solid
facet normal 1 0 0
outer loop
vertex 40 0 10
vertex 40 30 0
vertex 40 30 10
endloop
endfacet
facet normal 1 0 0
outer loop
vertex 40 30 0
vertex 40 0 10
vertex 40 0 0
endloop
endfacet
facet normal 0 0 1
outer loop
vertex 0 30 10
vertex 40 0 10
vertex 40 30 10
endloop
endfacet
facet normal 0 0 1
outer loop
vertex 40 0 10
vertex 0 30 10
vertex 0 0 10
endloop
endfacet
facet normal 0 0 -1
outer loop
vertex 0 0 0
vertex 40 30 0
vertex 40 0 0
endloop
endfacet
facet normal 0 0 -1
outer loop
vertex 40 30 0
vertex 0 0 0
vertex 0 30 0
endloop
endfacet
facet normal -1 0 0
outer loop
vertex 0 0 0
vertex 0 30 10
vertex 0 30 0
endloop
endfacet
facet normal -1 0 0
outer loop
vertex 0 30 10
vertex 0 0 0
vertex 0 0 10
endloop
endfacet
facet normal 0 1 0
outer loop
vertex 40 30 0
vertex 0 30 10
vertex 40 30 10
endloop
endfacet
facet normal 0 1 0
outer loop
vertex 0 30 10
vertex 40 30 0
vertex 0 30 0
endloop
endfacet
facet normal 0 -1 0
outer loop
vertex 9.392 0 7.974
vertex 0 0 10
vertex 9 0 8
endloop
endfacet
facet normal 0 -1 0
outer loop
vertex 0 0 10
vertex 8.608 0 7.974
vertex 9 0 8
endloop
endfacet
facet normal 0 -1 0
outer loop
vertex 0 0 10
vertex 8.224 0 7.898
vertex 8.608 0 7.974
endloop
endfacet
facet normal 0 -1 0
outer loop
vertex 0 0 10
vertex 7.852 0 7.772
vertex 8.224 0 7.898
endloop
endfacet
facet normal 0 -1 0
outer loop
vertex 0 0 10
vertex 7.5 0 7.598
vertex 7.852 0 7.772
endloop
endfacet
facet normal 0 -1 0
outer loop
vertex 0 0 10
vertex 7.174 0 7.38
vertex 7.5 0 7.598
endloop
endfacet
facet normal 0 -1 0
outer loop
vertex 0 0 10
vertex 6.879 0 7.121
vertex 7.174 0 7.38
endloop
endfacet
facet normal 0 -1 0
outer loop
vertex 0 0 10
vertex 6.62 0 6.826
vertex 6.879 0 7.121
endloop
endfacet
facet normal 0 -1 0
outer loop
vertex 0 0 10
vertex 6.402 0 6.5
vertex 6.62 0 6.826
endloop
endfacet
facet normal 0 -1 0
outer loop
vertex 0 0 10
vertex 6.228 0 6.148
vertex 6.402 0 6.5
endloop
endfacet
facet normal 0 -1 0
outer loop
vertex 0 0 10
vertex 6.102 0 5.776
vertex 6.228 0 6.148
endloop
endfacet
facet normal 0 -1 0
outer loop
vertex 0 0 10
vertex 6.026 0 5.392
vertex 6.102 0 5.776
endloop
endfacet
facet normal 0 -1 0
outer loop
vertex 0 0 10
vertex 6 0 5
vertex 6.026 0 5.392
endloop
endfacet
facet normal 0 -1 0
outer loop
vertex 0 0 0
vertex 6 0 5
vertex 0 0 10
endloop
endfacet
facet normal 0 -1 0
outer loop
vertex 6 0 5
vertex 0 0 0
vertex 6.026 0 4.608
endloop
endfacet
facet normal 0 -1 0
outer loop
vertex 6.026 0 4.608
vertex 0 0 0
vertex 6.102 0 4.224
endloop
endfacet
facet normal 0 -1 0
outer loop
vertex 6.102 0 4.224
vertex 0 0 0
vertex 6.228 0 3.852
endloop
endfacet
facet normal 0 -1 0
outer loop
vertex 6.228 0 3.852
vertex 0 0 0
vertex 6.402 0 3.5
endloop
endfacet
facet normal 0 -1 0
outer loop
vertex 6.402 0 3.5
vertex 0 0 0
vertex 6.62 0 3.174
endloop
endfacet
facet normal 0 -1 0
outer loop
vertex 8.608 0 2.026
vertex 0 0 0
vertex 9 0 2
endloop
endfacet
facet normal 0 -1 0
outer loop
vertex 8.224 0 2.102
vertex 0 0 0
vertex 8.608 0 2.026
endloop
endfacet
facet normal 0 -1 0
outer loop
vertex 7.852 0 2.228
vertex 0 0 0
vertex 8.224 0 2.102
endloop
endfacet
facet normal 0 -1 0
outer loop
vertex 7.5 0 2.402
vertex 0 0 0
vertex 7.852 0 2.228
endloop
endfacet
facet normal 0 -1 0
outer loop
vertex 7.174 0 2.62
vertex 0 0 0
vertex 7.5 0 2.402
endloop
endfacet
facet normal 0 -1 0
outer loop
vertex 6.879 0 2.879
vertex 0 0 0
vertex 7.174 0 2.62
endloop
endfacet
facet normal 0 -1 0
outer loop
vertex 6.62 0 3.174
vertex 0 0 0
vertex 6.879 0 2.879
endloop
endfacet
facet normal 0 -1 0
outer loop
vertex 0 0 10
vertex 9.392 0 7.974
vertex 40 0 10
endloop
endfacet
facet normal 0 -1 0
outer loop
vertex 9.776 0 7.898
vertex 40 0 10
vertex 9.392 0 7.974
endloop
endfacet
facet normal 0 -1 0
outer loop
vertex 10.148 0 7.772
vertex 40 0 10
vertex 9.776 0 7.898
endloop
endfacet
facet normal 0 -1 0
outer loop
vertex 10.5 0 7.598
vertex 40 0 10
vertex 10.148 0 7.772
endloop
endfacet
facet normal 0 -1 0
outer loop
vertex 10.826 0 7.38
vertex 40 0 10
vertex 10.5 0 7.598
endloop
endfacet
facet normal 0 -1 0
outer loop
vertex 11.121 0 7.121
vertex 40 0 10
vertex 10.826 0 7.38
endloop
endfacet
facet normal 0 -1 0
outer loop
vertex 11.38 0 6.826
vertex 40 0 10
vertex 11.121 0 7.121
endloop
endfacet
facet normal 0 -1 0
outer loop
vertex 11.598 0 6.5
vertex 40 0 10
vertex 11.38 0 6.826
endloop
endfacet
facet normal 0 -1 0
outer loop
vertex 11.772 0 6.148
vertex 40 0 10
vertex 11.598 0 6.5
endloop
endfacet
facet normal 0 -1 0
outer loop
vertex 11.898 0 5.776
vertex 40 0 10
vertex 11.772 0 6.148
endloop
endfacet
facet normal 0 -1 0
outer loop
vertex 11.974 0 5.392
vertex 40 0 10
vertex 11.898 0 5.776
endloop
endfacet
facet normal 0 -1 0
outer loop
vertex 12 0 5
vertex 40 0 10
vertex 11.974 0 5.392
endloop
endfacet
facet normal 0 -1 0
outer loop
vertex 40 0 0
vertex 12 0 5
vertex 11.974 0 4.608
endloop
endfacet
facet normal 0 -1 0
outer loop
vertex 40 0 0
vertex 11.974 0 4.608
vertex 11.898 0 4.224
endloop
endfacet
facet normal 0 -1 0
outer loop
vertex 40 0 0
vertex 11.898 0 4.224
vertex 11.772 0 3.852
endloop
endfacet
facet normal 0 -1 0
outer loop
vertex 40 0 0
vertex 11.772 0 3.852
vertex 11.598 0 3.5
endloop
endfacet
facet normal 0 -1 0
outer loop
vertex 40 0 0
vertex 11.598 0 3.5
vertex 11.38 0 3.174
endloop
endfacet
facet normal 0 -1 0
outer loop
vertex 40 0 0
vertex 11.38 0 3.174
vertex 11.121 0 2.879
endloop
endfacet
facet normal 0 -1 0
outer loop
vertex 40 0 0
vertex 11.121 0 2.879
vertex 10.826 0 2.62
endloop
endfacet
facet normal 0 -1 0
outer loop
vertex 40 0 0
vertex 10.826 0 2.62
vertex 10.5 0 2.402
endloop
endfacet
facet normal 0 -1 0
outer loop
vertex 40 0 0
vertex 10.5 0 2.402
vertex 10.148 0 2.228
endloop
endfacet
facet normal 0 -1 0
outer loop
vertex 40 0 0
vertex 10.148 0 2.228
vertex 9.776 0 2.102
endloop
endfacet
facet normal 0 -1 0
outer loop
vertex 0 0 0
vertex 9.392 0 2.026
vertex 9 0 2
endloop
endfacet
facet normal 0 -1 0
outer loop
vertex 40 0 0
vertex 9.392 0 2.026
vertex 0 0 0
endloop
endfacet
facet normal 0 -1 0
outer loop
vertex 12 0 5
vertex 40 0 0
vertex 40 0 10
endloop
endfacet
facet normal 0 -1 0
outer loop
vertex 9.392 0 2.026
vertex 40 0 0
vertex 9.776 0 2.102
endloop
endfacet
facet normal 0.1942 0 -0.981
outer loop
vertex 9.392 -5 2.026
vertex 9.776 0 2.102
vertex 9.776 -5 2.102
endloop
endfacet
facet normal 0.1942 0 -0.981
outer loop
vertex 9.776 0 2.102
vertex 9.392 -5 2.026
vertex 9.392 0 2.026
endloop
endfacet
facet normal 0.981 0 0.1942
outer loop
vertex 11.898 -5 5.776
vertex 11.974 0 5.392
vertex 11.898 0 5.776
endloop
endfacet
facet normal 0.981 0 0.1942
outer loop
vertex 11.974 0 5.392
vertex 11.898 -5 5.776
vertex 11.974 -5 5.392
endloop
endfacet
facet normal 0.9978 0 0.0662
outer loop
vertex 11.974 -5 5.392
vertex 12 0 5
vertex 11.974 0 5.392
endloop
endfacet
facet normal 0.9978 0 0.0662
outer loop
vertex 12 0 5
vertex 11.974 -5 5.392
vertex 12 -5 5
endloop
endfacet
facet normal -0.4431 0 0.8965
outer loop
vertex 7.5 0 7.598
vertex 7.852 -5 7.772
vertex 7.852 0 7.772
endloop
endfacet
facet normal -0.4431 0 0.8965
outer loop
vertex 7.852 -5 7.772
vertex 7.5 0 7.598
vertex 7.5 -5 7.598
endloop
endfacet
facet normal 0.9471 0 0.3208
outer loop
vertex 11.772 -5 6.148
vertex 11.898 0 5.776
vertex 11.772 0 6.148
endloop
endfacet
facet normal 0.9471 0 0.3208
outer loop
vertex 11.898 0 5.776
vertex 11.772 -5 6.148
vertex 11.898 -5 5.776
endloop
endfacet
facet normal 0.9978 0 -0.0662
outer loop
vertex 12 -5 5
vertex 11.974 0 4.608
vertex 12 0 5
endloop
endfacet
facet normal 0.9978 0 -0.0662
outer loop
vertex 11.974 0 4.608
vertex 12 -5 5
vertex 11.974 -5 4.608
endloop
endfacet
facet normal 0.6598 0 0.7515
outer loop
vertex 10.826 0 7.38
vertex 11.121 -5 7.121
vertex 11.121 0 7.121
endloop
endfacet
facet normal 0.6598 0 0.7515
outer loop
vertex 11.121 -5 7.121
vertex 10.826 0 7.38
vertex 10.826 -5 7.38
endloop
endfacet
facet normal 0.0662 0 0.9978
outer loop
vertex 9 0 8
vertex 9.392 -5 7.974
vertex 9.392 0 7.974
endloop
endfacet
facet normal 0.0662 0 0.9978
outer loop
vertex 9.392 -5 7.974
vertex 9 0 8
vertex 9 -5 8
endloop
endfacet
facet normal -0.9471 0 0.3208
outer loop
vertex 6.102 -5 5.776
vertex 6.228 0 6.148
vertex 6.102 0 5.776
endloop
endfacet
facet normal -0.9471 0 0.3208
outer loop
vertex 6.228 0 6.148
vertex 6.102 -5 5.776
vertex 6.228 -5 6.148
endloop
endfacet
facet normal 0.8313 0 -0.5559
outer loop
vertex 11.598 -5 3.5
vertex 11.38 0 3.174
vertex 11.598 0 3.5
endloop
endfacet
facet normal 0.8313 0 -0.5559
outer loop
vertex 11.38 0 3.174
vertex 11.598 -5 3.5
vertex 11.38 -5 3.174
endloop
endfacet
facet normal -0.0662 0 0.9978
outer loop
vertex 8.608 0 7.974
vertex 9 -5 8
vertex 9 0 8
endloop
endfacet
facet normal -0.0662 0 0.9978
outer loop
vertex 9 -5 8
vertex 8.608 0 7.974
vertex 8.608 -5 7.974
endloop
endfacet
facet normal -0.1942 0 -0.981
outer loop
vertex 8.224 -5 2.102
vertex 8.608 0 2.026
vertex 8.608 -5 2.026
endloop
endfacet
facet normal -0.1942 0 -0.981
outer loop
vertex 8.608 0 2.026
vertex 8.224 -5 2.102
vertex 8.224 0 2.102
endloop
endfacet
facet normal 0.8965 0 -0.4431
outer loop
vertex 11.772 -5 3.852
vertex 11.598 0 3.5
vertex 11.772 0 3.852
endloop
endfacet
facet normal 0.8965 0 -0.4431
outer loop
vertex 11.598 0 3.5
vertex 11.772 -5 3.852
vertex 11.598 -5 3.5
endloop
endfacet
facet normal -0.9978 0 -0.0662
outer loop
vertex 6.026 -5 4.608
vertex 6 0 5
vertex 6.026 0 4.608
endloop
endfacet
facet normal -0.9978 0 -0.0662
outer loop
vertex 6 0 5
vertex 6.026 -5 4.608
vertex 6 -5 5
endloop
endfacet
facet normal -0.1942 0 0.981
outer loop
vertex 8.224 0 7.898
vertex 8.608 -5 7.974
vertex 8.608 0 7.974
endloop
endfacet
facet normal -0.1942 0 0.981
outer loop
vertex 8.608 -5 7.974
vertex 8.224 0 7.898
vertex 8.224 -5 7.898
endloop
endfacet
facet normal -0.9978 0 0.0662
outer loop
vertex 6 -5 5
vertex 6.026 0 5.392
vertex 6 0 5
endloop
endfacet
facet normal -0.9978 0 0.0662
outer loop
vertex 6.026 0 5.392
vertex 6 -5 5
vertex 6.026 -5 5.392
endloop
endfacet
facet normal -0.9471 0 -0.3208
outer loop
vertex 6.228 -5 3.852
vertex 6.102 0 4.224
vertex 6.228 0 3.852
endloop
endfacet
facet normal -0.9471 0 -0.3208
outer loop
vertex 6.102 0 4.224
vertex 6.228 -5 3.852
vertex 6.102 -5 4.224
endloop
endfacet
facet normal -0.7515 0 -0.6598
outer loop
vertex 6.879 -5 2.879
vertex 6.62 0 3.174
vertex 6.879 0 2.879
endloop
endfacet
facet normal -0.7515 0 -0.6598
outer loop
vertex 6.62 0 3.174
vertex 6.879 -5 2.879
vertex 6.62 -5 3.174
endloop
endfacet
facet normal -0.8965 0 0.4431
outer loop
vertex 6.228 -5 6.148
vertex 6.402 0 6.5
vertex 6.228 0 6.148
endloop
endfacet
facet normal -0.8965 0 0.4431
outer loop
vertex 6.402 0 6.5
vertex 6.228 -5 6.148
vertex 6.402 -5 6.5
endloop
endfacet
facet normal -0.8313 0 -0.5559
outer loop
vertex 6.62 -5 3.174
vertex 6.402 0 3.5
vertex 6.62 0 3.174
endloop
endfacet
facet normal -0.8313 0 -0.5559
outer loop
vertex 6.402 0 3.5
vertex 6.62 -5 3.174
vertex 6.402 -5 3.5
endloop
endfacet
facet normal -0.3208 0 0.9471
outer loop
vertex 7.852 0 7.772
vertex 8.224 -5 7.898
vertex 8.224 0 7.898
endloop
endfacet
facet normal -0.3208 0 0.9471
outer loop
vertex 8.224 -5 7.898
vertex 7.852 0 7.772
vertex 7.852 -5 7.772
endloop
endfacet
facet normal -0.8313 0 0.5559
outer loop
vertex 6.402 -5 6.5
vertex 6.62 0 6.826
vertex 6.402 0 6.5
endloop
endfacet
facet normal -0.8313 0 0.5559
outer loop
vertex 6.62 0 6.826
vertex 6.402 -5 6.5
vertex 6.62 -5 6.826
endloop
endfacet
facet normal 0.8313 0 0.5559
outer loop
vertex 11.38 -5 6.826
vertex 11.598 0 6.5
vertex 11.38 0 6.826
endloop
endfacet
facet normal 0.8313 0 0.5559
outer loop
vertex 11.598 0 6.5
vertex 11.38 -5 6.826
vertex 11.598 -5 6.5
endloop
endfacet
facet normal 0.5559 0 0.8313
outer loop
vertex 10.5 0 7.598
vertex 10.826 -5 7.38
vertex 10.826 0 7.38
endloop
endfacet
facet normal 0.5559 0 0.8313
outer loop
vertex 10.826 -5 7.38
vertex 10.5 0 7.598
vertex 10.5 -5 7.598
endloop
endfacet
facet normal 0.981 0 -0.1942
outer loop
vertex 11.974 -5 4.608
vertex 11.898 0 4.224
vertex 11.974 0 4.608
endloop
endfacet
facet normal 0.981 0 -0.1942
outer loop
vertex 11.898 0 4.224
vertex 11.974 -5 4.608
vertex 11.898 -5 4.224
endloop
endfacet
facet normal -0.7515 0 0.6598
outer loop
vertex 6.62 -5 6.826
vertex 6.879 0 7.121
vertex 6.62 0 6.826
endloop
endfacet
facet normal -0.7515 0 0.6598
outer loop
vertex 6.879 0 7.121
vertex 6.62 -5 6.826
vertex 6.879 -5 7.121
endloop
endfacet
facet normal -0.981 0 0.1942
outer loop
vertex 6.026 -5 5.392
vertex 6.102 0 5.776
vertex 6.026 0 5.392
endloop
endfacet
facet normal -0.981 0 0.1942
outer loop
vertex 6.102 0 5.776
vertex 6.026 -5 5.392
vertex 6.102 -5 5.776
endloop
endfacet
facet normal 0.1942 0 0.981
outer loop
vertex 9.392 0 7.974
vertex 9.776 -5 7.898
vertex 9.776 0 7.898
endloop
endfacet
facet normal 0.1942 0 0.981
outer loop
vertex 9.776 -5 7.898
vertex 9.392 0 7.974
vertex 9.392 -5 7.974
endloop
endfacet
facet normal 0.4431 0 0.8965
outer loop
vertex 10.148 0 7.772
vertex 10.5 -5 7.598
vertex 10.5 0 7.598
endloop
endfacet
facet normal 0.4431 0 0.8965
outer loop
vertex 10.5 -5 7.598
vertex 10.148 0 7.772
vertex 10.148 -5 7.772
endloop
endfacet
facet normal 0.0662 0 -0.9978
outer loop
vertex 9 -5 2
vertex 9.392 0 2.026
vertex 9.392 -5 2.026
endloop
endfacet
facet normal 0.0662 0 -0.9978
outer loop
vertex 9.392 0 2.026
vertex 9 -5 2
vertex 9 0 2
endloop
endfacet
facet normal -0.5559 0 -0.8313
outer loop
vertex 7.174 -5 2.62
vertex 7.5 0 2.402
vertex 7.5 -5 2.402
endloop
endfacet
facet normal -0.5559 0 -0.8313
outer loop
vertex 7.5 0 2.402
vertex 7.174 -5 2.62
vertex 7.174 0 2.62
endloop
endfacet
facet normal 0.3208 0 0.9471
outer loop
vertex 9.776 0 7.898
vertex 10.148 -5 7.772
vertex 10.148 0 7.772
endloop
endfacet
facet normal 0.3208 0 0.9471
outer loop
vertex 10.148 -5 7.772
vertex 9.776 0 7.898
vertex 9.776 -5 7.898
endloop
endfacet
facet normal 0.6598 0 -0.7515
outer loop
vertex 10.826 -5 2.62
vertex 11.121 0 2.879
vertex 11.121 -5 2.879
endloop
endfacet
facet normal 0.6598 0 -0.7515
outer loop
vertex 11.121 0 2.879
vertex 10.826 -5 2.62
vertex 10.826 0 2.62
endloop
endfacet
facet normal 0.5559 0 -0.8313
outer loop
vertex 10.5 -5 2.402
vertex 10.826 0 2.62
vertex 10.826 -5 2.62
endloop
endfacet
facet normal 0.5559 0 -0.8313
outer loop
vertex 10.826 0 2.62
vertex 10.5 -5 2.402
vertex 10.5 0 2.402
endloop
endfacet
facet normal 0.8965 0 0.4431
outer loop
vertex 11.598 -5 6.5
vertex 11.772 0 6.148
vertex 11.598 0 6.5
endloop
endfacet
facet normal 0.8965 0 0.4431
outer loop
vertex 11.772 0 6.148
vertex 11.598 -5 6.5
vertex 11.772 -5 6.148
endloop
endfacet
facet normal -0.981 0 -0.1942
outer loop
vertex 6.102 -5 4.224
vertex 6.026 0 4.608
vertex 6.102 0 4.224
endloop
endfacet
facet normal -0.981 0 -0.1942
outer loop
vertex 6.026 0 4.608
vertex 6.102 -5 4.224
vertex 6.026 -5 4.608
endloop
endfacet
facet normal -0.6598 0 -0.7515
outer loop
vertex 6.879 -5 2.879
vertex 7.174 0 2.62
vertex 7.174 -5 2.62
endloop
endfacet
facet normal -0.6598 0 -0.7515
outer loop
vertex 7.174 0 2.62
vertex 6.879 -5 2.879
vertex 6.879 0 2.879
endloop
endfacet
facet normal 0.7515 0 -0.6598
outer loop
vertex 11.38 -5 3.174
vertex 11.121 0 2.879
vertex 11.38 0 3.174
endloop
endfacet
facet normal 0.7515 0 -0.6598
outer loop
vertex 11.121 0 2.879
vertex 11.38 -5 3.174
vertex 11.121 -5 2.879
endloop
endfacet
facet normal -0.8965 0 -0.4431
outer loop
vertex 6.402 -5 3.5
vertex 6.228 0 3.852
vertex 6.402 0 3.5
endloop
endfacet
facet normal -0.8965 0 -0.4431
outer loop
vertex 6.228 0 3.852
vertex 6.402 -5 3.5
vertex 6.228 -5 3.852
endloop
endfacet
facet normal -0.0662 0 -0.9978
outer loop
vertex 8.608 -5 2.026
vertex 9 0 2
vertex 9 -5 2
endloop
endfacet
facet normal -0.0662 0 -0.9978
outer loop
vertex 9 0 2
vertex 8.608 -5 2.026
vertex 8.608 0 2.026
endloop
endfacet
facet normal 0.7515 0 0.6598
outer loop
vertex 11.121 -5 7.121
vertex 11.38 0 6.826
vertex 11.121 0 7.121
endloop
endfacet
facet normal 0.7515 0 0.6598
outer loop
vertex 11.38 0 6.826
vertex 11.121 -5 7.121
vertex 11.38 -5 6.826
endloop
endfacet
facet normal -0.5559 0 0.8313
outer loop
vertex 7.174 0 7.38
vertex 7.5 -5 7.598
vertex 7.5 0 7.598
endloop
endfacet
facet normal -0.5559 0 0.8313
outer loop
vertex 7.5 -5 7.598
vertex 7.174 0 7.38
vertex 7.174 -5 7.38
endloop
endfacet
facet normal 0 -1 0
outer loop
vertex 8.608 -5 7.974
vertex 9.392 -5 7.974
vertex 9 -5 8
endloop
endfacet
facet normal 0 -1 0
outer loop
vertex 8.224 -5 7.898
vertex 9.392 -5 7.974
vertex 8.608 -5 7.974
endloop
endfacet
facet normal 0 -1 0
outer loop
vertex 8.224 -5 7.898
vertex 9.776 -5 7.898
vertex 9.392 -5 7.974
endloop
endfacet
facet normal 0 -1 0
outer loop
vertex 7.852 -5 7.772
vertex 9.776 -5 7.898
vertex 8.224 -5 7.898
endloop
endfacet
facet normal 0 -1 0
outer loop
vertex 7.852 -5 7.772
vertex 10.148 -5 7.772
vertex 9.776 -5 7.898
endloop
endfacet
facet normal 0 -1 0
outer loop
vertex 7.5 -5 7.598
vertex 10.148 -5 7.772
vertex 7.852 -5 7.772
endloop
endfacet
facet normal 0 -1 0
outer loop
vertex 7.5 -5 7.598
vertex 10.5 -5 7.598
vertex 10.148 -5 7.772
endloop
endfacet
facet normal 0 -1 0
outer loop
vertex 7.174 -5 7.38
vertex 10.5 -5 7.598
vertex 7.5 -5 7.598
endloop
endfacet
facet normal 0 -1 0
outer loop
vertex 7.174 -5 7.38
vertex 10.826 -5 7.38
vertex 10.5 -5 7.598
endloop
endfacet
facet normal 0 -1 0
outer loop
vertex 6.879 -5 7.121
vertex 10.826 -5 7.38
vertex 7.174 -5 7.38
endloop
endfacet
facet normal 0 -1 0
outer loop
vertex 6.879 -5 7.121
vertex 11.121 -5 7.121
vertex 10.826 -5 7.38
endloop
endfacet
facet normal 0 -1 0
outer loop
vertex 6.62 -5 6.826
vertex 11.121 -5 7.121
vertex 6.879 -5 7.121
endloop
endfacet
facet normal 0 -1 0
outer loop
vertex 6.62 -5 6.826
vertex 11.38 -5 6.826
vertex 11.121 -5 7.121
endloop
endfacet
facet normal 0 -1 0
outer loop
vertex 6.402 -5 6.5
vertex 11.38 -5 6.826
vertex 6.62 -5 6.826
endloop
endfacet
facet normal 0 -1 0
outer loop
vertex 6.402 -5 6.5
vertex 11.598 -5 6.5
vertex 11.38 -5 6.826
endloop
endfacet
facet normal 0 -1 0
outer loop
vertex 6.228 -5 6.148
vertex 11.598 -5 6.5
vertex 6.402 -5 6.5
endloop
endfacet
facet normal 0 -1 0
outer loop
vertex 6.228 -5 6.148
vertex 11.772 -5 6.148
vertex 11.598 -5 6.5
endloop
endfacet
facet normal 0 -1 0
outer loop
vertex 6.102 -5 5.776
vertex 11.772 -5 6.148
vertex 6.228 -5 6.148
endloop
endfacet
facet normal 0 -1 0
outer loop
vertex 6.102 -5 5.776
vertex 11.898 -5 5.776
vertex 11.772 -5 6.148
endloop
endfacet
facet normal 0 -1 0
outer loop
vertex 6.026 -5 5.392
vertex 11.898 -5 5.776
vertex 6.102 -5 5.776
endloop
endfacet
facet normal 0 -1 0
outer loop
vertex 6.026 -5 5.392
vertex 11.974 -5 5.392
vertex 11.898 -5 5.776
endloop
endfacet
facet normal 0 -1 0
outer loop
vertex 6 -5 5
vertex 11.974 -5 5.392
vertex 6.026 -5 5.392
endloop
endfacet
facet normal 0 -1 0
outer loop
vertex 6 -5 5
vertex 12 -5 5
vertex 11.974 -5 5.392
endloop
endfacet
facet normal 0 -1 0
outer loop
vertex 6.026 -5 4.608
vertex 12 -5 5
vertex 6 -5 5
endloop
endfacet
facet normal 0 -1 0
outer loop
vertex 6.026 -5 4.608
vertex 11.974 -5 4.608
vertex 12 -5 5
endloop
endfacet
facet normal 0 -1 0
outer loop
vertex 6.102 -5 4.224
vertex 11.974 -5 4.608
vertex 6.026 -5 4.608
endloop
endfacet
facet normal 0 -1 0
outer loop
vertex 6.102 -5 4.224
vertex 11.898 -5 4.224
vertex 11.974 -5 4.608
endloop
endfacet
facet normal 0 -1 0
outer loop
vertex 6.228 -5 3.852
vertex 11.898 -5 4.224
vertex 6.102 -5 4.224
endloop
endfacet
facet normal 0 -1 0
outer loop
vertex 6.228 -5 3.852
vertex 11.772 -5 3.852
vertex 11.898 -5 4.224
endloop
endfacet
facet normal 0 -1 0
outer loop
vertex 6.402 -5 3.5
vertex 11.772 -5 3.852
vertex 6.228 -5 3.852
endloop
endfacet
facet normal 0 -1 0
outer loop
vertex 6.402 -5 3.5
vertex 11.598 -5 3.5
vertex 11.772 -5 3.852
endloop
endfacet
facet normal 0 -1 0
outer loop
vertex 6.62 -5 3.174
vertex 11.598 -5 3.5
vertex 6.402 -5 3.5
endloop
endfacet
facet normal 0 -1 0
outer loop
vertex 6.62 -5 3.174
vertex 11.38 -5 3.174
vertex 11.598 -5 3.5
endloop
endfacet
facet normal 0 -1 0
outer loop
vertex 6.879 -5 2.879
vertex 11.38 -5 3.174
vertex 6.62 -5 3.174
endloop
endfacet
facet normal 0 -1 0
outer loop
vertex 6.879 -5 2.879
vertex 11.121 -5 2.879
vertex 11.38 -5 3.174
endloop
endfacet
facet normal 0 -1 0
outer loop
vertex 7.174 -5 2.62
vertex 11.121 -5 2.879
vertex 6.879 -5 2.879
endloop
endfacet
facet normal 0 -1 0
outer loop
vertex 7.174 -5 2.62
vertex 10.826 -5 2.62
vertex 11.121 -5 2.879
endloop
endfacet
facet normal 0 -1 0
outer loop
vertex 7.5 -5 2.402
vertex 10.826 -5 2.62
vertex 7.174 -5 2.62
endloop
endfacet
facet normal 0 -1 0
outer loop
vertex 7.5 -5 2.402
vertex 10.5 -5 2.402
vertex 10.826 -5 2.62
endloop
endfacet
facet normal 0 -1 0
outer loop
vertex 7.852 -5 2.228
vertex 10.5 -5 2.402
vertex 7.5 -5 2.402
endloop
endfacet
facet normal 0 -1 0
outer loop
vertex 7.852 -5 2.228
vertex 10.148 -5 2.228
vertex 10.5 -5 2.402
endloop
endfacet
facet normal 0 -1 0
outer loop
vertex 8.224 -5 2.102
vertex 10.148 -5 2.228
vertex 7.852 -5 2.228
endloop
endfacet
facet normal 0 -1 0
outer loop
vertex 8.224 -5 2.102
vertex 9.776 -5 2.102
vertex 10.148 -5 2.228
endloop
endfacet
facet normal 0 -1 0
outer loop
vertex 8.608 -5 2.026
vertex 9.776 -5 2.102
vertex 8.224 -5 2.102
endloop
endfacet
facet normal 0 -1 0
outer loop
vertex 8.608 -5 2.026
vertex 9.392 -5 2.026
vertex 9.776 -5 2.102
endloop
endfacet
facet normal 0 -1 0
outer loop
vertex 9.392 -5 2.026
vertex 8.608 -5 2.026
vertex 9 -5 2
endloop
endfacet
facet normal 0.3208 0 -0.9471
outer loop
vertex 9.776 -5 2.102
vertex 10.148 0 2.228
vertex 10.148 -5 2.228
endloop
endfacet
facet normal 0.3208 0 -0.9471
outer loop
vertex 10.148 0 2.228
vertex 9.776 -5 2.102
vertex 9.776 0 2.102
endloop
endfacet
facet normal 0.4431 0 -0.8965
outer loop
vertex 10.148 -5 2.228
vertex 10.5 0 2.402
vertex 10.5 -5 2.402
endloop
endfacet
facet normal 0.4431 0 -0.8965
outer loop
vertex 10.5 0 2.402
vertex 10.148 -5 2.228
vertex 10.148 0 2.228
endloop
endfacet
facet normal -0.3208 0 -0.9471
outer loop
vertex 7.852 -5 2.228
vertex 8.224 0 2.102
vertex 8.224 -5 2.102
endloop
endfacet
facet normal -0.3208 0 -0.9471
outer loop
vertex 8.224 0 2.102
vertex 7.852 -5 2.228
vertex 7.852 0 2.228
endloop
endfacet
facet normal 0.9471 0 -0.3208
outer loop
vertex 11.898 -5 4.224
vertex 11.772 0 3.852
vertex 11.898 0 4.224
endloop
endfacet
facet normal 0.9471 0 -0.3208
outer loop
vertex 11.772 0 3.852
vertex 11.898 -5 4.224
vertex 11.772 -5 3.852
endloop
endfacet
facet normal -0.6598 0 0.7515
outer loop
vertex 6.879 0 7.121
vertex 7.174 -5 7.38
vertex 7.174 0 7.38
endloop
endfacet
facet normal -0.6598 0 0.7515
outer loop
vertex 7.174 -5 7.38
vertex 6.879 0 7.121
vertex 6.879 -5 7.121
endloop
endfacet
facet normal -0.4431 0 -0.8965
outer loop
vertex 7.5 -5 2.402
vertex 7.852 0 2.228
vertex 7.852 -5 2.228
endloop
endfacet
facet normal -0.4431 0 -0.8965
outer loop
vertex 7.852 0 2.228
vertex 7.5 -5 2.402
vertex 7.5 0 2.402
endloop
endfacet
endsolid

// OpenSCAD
// units=mm — generated by scad_emitter.py
// part=unnamed
$fn = 48;

union() { cube([40, 30, 10]); translate([9, 0.5, 5]) rotate([90, 0, 0]) cylinder(h=5.5, r=3, $fn=$fn); }
